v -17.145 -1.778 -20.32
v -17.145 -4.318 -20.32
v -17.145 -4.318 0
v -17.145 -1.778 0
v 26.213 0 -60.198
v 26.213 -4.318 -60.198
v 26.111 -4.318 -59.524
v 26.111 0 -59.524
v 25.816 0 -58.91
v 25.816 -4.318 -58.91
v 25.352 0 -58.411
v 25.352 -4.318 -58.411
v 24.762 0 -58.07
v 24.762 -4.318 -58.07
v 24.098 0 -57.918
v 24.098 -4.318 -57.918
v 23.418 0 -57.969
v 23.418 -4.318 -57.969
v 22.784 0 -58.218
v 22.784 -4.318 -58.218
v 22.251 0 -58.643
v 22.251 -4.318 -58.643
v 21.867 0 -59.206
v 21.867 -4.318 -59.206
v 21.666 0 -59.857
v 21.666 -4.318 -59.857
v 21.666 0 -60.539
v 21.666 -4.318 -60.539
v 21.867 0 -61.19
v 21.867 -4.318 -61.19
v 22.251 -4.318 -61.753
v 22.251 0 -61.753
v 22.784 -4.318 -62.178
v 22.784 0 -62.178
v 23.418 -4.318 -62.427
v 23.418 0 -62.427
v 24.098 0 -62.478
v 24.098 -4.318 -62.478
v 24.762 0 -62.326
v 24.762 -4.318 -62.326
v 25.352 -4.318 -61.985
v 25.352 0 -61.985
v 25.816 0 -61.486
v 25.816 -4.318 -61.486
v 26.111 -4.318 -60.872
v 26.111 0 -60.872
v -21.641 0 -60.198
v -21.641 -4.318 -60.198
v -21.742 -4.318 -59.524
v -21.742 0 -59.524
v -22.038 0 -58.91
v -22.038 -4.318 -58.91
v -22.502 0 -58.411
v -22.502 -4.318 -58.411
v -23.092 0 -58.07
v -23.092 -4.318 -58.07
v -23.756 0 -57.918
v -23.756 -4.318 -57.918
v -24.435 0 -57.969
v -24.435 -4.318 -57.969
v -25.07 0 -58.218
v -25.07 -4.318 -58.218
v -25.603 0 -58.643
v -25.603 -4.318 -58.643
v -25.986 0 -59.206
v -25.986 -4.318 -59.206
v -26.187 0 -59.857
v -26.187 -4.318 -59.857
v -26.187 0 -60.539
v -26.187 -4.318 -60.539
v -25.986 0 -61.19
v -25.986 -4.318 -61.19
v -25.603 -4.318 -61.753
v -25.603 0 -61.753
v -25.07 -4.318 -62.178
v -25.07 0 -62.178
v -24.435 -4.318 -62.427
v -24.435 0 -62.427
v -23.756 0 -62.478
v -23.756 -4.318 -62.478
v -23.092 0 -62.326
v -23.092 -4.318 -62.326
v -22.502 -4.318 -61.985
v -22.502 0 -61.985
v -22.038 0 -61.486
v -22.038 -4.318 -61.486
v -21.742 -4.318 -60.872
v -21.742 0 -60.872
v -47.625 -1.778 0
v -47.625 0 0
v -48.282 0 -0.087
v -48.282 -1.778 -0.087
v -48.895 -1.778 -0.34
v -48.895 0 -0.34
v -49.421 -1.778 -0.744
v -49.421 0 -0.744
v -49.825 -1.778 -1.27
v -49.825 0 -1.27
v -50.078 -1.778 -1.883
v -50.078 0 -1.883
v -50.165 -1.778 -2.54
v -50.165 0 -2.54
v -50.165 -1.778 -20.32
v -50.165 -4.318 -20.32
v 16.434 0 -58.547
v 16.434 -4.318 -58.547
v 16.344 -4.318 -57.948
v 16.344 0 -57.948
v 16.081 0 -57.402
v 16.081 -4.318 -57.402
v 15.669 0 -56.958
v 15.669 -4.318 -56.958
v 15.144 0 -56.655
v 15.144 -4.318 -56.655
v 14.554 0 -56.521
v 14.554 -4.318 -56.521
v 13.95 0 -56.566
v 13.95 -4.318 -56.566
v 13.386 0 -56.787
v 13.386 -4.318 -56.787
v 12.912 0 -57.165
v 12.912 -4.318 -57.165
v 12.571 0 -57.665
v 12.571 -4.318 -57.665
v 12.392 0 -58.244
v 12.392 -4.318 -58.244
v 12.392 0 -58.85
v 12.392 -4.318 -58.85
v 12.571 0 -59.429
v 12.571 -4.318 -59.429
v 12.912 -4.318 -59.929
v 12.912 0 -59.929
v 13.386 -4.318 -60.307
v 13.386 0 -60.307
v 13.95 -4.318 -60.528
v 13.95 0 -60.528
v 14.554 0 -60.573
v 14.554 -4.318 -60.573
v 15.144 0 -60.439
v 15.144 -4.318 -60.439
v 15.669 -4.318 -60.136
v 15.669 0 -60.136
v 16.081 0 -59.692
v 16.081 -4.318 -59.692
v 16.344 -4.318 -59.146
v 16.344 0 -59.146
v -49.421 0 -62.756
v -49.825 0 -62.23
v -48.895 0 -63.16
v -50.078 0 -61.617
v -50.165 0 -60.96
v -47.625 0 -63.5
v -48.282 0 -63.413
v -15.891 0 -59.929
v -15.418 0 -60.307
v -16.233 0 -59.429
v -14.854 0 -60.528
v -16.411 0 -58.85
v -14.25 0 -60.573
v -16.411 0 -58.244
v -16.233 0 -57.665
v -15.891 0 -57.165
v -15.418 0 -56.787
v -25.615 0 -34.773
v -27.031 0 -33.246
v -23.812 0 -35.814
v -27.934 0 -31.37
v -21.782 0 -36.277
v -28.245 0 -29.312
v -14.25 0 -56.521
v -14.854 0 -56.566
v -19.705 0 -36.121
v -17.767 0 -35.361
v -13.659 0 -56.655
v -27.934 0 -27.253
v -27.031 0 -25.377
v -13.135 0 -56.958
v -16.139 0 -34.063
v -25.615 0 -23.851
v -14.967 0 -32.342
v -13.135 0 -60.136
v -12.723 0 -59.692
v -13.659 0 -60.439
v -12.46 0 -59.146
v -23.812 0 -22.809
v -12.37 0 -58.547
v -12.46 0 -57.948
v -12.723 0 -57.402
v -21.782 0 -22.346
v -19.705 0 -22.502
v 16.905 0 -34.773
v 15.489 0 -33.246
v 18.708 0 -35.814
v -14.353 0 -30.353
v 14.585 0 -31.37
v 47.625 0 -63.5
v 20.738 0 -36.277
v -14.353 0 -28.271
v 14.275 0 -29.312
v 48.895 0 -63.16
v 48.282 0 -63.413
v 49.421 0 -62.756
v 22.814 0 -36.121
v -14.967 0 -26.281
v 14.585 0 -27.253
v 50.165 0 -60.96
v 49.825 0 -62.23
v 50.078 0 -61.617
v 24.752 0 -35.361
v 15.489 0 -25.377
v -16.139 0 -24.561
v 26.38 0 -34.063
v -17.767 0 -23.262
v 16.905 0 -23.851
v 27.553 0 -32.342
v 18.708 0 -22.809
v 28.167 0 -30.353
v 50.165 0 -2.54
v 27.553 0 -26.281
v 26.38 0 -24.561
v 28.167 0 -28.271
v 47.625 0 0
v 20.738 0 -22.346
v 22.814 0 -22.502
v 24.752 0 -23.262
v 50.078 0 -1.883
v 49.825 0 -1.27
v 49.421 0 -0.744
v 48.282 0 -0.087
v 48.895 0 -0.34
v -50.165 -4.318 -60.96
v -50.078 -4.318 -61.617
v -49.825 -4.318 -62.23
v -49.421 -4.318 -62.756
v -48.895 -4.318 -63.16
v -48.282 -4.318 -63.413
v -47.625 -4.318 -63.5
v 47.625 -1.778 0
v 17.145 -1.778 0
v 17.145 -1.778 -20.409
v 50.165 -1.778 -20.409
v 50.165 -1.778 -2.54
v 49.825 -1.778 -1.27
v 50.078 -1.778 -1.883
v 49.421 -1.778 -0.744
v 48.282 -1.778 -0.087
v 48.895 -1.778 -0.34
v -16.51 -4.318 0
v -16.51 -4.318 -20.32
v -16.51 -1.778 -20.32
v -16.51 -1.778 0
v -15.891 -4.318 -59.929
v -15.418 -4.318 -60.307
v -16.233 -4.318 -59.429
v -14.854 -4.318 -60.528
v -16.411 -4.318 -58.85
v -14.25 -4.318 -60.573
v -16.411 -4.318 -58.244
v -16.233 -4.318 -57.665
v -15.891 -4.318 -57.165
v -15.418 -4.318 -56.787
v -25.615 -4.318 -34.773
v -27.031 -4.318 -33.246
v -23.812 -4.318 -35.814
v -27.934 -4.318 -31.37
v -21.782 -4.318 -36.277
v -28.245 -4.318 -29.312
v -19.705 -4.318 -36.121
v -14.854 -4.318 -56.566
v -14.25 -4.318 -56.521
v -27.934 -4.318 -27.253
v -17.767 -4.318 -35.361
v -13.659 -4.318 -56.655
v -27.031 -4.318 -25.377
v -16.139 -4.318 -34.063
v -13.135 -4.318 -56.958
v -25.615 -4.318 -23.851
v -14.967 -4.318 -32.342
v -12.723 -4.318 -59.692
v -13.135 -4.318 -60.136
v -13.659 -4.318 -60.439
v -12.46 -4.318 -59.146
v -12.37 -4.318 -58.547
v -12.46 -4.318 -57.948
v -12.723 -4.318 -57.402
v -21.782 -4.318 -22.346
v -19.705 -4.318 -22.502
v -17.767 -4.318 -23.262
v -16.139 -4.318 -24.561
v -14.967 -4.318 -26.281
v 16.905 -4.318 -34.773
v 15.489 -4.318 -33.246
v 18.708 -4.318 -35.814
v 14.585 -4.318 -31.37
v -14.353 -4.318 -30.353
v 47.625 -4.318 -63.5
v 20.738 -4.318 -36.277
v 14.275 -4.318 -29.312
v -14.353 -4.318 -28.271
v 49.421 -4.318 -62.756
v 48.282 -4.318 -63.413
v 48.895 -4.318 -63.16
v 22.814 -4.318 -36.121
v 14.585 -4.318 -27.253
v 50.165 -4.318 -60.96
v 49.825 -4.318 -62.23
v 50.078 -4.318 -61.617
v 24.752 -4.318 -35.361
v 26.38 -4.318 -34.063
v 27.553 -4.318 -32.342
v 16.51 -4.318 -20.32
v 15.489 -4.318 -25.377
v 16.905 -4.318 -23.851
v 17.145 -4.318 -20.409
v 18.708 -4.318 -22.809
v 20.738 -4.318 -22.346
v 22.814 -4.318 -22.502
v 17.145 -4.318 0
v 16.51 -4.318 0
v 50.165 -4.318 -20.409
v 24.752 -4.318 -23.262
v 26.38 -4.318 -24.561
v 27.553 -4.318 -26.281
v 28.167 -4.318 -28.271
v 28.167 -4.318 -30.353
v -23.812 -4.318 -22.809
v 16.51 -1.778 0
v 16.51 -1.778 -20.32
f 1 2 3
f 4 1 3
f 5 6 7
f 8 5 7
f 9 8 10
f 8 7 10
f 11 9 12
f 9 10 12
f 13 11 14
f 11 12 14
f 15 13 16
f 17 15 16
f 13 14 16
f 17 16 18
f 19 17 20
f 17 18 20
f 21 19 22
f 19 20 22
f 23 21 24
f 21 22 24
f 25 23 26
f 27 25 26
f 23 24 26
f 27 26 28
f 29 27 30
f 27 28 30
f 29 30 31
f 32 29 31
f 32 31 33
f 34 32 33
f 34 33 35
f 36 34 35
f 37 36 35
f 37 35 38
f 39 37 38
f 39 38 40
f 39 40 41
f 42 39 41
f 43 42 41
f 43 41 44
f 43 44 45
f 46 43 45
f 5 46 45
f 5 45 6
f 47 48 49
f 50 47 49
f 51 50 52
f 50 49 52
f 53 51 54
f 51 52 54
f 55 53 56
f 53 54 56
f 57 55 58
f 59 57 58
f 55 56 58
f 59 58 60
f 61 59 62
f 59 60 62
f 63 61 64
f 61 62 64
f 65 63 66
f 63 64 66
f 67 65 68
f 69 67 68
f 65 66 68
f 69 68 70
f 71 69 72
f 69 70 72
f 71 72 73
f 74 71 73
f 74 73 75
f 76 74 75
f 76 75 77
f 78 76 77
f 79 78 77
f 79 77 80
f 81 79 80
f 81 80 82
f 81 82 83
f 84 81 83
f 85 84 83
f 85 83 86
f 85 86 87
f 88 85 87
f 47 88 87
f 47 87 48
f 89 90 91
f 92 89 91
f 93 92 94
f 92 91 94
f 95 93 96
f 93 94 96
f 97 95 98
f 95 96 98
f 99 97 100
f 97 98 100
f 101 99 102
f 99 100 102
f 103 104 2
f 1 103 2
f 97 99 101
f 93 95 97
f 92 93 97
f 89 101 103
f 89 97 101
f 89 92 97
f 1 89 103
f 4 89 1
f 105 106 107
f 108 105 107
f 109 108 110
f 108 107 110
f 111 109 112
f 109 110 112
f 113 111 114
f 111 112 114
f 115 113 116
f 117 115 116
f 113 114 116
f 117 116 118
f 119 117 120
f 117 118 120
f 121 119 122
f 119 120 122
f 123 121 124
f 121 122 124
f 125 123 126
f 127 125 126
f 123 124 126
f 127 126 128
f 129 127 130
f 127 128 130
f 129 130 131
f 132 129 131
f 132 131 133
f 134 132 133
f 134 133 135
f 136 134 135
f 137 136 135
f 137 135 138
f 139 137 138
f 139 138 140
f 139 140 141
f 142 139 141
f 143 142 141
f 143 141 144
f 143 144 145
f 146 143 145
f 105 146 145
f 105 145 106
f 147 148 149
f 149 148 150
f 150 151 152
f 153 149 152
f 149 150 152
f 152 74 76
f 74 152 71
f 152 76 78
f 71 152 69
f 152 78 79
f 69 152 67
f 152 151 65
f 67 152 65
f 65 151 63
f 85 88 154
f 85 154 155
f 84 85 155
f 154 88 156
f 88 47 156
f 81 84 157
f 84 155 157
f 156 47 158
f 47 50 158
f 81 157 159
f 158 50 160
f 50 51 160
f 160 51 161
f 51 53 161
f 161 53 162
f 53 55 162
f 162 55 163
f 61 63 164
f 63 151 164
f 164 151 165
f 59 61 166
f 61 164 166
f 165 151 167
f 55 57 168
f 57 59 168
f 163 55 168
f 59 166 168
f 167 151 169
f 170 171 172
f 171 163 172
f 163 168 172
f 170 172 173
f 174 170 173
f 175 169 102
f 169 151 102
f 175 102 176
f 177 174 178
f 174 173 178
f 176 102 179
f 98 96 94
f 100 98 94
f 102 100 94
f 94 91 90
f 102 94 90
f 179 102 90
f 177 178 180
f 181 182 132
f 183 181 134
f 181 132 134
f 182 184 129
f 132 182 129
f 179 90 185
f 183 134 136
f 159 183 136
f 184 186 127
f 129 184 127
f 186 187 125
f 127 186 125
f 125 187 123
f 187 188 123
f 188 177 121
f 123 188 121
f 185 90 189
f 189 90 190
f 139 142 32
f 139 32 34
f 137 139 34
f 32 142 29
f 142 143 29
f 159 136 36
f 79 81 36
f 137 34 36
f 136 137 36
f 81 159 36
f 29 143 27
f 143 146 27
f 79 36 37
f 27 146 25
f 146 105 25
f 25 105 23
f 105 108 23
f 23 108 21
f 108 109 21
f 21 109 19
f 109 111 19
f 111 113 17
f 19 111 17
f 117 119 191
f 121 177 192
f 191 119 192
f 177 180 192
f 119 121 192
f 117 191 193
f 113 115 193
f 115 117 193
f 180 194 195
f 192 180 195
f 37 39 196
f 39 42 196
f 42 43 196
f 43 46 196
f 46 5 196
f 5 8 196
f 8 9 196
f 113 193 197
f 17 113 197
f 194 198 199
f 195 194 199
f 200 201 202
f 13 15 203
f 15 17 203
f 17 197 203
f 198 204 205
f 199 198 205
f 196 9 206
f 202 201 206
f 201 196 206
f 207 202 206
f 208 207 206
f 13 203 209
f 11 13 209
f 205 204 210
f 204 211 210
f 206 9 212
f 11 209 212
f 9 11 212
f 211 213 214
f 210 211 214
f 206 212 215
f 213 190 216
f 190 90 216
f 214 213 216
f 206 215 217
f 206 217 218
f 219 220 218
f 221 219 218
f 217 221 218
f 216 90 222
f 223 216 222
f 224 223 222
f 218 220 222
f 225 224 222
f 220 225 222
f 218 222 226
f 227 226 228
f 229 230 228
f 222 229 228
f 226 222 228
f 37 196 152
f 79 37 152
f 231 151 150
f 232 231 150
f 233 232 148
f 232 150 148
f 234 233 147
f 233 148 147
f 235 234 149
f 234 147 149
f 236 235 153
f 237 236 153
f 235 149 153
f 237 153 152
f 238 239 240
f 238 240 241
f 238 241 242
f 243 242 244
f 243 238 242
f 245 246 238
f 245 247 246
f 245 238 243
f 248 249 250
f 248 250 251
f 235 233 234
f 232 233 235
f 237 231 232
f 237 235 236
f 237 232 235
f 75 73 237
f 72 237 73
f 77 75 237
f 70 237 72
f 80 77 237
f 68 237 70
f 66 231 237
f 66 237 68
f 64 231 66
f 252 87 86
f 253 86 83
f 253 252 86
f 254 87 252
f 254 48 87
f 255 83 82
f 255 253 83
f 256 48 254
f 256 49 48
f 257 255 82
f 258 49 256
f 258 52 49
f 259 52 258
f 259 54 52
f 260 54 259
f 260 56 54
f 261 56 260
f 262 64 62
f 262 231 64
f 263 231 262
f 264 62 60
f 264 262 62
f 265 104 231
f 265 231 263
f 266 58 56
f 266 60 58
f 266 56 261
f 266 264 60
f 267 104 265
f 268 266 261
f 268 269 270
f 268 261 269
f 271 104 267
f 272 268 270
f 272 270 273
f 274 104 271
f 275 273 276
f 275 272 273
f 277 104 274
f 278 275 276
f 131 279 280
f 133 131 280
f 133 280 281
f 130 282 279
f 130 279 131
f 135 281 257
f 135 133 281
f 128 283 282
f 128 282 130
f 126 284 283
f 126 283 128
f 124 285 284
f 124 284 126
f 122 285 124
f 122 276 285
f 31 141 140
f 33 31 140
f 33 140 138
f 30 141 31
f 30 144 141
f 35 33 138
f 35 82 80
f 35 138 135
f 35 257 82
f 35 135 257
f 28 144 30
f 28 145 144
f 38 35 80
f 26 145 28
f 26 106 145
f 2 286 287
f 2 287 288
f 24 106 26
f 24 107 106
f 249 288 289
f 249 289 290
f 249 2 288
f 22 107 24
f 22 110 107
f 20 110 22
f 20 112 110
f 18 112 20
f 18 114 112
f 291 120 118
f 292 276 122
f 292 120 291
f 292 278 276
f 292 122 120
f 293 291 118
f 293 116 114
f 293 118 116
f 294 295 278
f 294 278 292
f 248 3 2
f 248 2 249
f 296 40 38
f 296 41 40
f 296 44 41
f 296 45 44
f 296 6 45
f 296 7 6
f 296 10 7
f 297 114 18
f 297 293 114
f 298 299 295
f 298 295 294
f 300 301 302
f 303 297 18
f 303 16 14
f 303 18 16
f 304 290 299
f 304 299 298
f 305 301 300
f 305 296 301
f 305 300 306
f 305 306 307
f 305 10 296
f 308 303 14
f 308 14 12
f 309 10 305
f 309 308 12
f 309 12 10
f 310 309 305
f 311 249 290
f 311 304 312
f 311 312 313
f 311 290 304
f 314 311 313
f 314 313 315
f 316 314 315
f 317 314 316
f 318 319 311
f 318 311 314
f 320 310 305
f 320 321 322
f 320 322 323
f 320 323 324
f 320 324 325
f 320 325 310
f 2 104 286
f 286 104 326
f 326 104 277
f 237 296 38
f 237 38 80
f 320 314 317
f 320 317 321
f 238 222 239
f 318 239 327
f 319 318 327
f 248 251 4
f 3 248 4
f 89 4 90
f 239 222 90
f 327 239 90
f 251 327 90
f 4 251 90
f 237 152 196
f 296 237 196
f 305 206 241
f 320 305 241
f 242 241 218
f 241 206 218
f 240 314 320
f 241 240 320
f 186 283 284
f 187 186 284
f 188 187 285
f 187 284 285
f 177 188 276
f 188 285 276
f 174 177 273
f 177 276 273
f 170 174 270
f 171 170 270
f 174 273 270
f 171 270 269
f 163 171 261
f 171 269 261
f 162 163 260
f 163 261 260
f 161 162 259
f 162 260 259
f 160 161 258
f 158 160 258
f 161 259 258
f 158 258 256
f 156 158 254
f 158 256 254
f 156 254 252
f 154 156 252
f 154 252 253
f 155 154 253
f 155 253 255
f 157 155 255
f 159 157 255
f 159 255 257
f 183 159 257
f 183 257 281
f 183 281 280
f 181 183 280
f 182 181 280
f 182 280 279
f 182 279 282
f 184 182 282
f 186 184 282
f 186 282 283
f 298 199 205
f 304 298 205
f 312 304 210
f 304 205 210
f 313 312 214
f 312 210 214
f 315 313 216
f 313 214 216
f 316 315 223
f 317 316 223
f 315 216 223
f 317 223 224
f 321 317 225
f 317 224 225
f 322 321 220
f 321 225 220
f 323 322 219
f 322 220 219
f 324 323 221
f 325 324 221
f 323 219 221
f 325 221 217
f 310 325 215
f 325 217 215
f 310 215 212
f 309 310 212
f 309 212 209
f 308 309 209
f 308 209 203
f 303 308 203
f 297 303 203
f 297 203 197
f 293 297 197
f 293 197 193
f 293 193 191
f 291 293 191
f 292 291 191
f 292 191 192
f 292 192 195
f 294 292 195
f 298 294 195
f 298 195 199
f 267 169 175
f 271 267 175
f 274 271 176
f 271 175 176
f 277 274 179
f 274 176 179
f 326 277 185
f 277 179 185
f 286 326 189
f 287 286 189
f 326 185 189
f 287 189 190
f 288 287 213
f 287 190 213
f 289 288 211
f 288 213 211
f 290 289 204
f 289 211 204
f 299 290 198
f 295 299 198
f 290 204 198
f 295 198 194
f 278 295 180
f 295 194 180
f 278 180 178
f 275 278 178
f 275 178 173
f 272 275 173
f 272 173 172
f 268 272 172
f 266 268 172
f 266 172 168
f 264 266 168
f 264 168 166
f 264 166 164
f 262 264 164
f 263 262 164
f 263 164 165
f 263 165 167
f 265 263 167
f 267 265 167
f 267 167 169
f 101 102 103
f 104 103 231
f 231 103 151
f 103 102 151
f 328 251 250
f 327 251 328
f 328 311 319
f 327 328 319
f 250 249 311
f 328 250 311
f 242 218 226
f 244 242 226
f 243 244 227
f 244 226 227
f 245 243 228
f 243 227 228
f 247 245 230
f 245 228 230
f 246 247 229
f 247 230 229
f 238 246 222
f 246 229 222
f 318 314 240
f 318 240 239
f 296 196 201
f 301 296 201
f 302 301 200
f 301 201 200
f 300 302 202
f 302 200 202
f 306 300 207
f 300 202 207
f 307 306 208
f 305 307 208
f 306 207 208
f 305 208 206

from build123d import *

# Parameters (mm, degrees)
F1_DEPTH = 4.318
F3_D     = 13.97
F4_W     = 33.02
F4_H     = 20.32
F4_H_2   = 20.409275
F5_DEPTH = 2.54
F8_D     = 4.572
F9_D     = 4.064


with BuildPart() as f1:
    # F0 (on Front) → F1 (new body)
    with BuildSketch(Plane.XZ):
        with BuildLine():
            Line((47.625, 0), (-47.625, 0))
            ThreePointArc((-47.625, 0), (-49.421051, -0.743949), (-50.165, -2.54))
            Line((-50.165, -2.54), (-50.165, -60.96))
            ThreePointArc((-50.165, -60.96), (-49.421051, -62.756051), (-47.625, -63.5))
            Line((-47.625, -63.5), (47.625, -63.5))
            ThreePointArc((47.625, -63.5), (49.421051, -62.756051), (50.165, -60.96))
            Line((50.165, -60.96), (50.165, -2.54))
            ThreePointArc((50.165, -2.54), (49.421051, -0.743949), (47.625, 0))
        make_face()
    extrude(amount=F1_DEPTH)

    # F3 (through all)
    with Locations(Plane.XZ.offset(4.318)):
        with Locations((-21.2598, -29.3116), (21.2598, -29.3116)):
            Hole(F3_D / 2)

    # F4 (on face) → F5 (cut)
    with BuildSketch(Plane.XZ.offset(4.318)):
        with Locations((0, -10.16)):
            Rectangle(F4_W, F4_H)
        with Locations((-33.655, -10.16)):
            Rectangle(F4_W, F4_H)
        with Locations((33.655, -10.204637)):
            Rectangle(F4_W, F4_H_2)
    extrude(amount=-F5_DEPTH, mode=Mode.SUBTRACT)

    # F8 (through all)
    with Locations(Plane(origin=(0, 0, 0), x_dir=(-1, 0, 0), z_dir=(0, 1, 0))):
        with Locations((-23.9268, -60.198), (23.9268, -60.198)):
            Hole(F8_D / 2)

    # F9 (through all)
    with Locations(Plane(origin=(0, 0, 0), x_dir=(-1, 0, 0), z_dir=(0, 1, 0))):
        with Locations((-14.4018, -58.547), (14.4018, -58.547)):
            Hole(F9_D / 2)


solid = f1.part
